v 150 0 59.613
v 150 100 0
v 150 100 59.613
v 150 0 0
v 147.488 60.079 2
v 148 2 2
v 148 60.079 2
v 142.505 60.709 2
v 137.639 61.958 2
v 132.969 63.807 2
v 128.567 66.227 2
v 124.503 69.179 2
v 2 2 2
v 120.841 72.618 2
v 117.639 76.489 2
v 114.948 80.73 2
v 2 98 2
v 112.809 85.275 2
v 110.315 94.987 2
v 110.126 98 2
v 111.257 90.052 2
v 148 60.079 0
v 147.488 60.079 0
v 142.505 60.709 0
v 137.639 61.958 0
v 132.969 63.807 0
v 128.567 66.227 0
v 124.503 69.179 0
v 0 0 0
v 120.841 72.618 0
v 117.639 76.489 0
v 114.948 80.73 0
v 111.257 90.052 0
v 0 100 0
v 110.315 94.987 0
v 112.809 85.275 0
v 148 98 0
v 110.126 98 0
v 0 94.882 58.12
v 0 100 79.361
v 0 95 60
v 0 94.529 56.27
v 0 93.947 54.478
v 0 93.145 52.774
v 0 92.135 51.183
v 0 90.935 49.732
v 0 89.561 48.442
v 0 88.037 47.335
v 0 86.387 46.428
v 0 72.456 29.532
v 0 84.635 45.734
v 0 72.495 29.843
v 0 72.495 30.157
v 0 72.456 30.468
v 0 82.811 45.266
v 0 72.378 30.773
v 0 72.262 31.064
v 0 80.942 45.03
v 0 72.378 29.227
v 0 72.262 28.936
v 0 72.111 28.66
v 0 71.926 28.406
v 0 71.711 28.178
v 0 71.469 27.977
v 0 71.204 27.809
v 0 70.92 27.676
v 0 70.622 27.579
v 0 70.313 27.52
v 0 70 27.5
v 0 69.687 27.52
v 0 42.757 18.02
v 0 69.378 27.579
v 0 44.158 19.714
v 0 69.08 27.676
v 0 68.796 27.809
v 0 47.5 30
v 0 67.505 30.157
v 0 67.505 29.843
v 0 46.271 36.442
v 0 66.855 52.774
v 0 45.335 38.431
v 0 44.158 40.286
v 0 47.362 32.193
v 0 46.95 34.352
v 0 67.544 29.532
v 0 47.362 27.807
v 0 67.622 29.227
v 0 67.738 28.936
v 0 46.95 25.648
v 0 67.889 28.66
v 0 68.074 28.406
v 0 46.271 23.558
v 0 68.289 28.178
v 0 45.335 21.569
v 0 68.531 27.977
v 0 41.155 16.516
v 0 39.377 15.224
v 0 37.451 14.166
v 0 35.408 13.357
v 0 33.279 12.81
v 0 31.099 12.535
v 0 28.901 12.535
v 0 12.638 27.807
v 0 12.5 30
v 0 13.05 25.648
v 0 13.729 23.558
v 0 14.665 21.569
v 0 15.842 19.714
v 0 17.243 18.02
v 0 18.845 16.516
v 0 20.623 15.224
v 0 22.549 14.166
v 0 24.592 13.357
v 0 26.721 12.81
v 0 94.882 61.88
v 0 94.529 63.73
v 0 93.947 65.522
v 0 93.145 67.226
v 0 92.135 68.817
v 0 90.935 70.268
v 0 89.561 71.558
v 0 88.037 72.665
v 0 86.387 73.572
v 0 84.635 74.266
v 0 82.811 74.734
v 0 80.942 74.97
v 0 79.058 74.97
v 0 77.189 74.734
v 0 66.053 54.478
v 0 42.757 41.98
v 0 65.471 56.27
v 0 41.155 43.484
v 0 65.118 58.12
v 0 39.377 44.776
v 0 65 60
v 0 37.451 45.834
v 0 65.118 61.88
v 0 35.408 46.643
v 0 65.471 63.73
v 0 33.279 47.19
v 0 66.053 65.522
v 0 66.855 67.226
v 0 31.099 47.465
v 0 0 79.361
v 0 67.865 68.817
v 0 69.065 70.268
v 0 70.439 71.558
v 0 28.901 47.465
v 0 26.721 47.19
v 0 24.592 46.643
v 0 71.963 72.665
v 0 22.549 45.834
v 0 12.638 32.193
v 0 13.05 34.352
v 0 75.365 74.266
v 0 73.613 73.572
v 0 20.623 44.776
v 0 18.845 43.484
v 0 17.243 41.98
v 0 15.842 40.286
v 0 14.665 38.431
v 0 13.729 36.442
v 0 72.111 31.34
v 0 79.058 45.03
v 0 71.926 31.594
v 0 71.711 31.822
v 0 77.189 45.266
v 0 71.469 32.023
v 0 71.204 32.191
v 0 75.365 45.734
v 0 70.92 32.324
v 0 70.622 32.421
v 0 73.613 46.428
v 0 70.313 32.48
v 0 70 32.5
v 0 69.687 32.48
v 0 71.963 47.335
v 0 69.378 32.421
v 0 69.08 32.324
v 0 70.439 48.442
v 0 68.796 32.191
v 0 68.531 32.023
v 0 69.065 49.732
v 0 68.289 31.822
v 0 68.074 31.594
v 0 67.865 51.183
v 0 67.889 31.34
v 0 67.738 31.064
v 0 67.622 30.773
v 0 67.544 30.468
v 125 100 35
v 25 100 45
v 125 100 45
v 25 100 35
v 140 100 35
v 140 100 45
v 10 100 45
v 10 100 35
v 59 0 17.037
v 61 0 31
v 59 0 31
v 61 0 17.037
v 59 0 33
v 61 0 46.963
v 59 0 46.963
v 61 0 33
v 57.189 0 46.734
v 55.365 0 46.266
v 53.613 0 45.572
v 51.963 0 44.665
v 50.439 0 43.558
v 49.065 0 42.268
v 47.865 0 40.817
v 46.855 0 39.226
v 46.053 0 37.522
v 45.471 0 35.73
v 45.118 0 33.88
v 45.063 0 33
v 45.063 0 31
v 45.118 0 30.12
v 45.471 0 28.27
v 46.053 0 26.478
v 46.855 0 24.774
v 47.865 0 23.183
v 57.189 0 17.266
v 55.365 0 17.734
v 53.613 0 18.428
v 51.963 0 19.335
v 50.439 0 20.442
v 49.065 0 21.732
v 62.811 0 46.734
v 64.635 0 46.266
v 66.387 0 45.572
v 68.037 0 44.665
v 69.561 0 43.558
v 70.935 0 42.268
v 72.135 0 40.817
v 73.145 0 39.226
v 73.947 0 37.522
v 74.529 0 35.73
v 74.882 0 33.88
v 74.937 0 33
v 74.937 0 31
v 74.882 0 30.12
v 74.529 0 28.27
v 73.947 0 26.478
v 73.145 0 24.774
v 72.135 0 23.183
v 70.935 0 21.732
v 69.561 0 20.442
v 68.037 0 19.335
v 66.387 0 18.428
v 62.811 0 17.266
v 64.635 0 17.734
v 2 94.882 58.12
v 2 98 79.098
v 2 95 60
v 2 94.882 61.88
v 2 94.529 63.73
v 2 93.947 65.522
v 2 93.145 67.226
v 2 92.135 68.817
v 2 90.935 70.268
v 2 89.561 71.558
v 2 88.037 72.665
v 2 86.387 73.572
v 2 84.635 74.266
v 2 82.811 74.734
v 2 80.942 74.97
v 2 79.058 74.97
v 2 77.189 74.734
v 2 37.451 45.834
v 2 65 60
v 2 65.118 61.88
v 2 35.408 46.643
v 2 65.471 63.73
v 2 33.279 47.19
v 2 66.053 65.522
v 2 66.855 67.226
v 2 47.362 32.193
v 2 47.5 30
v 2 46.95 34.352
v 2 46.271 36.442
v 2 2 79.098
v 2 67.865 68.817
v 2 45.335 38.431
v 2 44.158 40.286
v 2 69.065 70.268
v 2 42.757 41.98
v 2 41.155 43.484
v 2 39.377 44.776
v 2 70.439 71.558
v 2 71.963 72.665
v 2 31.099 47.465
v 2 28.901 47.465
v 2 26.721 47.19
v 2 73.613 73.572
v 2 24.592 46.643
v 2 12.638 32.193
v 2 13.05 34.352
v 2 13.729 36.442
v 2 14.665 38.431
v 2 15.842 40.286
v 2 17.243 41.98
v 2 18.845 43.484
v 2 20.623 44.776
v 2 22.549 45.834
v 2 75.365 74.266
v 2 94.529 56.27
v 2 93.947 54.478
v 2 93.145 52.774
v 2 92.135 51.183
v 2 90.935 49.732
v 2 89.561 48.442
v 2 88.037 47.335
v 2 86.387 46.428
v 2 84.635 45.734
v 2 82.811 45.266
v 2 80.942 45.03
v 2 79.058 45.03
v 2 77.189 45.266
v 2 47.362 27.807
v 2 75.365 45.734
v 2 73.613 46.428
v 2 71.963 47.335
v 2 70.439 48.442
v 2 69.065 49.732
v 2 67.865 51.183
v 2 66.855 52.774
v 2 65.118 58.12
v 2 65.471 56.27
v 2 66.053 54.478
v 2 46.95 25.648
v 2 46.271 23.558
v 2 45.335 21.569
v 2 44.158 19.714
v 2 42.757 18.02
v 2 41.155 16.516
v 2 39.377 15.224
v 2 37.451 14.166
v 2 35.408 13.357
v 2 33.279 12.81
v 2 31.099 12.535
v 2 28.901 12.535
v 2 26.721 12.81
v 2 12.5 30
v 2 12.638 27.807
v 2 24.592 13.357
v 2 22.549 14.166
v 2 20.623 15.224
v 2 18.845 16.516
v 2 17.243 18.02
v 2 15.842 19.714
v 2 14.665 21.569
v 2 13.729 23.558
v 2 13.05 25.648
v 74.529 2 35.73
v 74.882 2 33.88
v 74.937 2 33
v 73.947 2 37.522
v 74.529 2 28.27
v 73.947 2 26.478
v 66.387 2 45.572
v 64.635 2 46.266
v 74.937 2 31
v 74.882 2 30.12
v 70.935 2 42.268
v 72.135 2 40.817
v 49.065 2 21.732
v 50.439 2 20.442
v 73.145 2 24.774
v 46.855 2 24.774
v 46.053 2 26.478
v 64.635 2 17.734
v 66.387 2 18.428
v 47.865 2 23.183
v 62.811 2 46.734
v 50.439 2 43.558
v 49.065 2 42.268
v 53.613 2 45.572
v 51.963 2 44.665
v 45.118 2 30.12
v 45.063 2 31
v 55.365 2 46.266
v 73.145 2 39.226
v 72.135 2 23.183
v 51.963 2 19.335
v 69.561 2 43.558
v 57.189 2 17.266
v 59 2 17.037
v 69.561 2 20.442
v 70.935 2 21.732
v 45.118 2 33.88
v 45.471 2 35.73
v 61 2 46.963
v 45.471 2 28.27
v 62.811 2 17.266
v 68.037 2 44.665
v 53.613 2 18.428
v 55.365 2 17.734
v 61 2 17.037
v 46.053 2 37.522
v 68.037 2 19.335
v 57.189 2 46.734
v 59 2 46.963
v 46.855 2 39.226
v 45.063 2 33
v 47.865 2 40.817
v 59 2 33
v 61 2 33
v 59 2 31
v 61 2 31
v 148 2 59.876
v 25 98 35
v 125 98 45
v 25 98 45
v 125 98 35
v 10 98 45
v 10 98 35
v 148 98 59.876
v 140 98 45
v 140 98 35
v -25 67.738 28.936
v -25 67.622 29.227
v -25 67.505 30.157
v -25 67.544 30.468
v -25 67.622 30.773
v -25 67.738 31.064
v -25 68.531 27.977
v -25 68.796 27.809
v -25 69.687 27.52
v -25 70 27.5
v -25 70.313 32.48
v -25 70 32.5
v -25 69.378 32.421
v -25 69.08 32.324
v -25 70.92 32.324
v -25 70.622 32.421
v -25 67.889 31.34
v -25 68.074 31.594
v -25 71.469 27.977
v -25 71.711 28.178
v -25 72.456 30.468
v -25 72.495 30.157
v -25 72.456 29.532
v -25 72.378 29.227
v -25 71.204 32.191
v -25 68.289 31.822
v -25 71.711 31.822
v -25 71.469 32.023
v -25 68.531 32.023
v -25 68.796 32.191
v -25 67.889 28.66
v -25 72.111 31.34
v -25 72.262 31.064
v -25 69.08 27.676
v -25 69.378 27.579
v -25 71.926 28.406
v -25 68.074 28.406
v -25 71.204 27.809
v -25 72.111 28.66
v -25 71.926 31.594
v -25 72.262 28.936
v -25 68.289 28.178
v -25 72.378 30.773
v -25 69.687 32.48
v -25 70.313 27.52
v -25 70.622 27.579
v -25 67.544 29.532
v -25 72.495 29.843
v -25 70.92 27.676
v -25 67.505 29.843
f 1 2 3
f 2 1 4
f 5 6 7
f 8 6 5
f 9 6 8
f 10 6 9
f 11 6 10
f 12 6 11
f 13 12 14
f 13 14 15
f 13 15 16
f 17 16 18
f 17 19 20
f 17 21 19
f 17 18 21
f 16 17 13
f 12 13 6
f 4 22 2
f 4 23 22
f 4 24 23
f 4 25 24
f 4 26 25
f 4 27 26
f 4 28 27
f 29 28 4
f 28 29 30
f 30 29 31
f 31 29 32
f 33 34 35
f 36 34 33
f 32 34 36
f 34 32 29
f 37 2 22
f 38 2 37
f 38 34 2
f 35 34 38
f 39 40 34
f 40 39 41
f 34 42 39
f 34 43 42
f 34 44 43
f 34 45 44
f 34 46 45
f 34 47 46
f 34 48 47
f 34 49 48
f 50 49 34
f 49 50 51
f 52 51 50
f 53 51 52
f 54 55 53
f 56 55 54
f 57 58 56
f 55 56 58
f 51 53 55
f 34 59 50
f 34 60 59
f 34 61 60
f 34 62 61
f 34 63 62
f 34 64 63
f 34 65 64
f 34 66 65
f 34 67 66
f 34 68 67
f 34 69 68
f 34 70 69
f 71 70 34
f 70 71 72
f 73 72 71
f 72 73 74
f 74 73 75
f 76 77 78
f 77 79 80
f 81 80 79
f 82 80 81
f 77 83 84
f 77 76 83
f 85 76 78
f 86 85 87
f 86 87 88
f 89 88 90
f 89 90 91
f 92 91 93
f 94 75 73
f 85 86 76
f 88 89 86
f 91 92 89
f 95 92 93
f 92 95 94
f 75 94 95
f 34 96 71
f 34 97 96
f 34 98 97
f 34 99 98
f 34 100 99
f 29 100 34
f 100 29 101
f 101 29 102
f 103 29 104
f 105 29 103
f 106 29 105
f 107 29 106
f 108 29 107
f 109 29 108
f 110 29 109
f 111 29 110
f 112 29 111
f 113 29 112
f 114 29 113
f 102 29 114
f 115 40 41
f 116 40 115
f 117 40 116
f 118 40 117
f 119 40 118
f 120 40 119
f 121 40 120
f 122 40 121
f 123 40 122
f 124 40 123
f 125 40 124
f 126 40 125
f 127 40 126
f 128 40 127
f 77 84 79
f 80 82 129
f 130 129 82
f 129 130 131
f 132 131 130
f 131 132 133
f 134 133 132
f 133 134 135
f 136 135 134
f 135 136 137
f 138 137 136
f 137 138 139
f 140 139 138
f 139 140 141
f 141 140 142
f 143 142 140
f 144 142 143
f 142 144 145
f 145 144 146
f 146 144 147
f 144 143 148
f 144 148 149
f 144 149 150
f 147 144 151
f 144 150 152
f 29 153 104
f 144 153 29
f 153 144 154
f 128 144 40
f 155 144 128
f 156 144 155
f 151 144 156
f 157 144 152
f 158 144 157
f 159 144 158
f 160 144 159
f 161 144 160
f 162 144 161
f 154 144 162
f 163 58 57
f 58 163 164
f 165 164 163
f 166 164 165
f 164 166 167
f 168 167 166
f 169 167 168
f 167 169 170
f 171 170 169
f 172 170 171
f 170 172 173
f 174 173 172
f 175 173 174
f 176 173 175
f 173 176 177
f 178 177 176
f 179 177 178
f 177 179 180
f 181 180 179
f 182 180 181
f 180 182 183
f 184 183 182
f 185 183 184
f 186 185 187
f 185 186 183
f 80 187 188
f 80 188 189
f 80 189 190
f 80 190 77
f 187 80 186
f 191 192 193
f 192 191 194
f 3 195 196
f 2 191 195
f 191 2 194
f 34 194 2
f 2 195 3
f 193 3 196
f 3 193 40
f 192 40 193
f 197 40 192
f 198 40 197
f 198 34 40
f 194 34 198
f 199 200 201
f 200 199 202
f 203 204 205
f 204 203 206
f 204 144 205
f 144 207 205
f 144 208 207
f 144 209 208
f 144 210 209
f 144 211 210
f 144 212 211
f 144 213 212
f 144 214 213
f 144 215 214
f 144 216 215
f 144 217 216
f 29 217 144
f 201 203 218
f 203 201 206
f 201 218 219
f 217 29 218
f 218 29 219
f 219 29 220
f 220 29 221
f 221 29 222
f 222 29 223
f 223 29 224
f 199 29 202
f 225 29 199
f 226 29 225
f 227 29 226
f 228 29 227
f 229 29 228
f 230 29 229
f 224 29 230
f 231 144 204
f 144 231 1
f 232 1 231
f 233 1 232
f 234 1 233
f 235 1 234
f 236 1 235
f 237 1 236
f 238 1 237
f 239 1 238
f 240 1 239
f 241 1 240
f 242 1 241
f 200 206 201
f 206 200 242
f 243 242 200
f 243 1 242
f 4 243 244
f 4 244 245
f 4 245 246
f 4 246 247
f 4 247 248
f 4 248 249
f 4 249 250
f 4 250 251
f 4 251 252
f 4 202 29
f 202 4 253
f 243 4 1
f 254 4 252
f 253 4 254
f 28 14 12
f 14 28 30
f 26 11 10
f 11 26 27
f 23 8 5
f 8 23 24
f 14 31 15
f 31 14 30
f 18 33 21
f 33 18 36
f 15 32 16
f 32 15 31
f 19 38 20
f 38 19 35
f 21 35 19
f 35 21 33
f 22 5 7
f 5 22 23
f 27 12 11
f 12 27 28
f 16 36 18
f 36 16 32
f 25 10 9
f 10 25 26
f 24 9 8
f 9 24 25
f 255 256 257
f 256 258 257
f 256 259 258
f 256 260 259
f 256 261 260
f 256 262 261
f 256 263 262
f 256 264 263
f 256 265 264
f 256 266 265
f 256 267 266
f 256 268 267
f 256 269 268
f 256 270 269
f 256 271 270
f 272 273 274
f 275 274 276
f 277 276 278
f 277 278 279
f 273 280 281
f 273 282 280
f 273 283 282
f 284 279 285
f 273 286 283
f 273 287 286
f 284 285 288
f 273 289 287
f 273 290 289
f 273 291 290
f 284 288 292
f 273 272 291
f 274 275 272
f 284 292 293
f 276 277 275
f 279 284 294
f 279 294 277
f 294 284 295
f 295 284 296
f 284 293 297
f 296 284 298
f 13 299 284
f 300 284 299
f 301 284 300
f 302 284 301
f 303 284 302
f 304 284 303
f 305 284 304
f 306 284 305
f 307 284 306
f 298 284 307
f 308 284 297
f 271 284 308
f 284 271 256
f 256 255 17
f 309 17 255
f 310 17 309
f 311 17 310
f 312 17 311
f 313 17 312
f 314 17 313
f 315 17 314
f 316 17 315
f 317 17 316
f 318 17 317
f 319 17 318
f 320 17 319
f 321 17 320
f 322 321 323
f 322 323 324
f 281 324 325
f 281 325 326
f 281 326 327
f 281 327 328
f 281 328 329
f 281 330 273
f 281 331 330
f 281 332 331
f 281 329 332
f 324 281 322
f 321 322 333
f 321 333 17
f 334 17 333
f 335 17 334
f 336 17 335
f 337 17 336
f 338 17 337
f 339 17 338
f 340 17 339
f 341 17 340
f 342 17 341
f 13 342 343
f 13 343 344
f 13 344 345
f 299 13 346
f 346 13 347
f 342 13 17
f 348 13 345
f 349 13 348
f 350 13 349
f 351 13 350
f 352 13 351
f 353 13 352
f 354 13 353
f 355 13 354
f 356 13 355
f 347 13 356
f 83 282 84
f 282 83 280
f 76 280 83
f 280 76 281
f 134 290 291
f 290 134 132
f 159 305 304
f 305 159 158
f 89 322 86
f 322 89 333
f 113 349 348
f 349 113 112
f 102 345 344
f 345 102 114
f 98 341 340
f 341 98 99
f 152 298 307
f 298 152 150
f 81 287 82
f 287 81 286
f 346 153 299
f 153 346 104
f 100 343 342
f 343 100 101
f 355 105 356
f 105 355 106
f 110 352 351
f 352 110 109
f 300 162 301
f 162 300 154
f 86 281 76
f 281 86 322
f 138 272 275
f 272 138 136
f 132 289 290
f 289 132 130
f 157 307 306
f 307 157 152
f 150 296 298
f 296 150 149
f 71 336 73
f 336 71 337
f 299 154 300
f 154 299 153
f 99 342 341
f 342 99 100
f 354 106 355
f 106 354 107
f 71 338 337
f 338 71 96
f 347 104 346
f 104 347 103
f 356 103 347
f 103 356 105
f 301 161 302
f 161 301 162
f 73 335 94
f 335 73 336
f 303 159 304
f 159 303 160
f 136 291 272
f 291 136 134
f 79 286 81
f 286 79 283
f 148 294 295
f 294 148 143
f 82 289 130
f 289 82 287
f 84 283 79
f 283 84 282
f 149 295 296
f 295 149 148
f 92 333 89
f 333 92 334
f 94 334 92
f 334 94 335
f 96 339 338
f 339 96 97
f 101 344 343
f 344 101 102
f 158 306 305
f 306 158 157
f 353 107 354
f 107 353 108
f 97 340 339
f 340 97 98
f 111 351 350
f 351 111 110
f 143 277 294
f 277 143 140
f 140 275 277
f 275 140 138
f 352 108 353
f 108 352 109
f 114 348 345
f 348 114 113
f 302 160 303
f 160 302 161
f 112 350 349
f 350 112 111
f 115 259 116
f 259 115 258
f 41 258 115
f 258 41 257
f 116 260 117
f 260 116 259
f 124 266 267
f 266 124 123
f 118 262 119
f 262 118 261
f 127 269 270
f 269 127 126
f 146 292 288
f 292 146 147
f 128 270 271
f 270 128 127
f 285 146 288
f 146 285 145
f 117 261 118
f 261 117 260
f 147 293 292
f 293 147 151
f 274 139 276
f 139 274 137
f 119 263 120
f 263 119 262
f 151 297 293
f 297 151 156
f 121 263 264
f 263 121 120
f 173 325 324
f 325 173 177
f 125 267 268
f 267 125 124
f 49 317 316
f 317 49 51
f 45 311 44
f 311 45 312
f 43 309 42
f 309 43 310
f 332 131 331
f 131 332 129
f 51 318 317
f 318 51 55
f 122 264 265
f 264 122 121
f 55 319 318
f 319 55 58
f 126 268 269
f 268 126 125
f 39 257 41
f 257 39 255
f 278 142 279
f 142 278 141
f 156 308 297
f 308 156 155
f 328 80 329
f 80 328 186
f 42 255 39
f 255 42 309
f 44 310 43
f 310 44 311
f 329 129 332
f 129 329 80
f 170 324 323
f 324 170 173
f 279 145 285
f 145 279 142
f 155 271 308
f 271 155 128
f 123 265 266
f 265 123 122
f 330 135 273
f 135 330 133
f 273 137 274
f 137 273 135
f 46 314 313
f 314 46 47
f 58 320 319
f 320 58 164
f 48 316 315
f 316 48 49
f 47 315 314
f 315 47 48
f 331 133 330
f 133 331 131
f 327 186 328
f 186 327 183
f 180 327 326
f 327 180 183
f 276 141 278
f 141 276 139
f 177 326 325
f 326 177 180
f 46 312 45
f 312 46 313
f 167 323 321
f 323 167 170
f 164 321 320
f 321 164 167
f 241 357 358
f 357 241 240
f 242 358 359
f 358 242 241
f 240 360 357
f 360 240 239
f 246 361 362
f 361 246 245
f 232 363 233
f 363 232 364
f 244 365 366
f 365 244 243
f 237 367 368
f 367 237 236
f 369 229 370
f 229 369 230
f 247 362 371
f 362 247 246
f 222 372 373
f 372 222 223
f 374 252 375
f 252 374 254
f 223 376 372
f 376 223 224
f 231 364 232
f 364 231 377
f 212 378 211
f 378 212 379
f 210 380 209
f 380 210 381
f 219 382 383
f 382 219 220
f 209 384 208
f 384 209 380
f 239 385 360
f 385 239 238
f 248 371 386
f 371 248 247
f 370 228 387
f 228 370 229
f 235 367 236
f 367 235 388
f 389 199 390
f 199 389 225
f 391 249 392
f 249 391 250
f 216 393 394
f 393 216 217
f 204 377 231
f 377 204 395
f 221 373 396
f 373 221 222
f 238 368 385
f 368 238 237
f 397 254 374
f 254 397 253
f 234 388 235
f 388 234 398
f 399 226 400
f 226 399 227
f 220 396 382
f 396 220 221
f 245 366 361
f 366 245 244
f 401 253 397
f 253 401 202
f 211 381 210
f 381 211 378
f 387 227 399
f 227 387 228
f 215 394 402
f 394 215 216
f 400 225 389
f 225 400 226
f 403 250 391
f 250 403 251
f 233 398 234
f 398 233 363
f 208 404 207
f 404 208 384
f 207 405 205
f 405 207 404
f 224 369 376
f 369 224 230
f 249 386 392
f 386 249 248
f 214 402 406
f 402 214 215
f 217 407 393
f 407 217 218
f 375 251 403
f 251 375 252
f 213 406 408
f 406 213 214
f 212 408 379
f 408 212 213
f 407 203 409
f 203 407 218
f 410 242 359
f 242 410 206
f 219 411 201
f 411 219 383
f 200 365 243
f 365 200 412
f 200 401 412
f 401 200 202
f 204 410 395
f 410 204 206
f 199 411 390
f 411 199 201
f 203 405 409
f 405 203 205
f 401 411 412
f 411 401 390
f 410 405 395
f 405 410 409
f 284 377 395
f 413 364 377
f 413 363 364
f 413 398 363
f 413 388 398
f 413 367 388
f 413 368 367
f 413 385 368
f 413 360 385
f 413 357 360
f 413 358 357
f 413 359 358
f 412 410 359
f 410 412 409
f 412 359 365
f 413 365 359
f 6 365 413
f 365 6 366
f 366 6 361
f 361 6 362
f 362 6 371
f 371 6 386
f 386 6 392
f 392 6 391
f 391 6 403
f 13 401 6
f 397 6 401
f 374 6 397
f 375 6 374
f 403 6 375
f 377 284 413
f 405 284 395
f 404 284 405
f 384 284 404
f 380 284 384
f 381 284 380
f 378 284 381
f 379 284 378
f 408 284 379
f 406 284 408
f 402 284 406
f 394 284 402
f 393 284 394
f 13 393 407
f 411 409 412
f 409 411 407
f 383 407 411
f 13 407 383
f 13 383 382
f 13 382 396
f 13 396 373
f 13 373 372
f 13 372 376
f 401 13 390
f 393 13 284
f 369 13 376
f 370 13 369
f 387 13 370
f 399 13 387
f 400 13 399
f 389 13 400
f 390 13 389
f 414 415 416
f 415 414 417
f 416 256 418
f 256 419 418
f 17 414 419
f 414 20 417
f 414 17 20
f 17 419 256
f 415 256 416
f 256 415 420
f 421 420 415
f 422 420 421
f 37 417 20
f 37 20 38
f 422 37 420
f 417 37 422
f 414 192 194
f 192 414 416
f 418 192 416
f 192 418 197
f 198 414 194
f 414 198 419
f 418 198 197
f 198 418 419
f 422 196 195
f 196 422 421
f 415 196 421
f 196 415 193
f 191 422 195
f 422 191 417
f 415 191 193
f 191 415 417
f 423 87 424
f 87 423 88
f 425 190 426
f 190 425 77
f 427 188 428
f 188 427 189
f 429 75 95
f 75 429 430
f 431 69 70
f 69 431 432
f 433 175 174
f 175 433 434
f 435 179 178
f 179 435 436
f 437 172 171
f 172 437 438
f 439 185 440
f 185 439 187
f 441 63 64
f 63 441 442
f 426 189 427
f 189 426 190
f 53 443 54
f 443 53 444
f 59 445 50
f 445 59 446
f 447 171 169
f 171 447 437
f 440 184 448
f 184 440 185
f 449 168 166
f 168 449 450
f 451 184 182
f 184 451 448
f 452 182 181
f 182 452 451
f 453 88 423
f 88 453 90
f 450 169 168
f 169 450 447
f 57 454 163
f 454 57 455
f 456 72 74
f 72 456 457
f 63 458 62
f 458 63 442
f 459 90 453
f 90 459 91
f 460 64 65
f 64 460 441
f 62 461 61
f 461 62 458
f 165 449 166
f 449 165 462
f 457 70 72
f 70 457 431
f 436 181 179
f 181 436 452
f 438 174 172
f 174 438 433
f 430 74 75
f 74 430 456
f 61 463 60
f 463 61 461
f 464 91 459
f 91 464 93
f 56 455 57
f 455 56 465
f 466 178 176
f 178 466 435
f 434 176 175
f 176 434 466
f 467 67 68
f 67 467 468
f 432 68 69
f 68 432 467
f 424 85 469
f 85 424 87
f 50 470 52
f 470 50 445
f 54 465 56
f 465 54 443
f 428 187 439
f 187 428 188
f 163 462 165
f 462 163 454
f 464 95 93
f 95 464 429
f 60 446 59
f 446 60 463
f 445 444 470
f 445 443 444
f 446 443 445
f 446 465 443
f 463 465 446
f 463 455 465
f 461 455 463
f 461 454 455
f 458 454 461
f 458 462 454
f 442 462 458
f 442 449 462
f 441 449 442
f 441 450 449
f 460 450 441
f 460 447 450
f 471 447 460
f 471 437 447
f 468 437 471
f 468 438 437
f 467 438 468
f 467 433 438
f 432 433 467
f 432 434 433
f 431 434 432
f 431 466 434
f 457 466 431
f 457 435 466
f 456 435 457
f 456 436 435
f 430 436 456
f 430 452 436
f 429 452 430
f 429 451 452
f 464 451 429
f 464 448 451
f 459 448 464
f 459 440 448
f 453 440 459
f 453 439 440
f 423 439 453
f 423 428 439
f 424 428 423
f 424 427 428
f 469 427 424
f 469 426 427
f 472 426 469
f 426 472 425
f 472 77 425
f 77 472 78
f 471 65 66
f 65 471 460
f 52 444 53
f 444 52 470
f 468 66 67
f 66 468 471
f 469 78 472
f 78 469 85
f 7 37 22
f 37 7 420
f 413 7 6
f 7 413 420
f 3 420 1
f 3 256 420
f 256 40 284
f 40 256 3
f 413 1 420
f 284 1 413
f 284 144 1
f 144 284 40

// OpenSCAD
roof = false;

difference() {
    if(!roof) {
        union() {
            // floor
            difference() {
                cube([150, 100, 2]);
                
                translate([150, 100, 0])
                cylinder(6, r=40, center=true, $fn=50);
            }

            // left wall
            difference() {
                cube([2, 100, 80]);
                
                // large hole
                translate([0, 30, 30])
                rotate([90, 0, 90])
                cylinder(6, d=35, center=true, $fn=50);
                
                // small hole
                translate([0, 80, 60])
                rotate([90, 0, 90])
                cylinder(6, d=30, center=true, $fn=50);
            }
            
            translate([0, 70, 30])
            rotate([0, -90, 0])
            cylinder(25, d=5, $fn=50);

            // right wall
            translate([148, 0, 0])
            cube([2, 100, 60]);
            
            // front wall
            base_points = [
                [0, 0, 0], //btm left
                [150, 0, 0], //btm right
                [0, 0, 80], //top left
                [150, 0, 60], //top right
            ];
            
            thickness = [0, 2, 0];
            
            points = [
                base_points[0],
                base_points[1],
                base_points[1] + thickness,
                base_points[0] + thickness,
                base_points[2],
                base_points[3],
                base_points[3] + thickness,
                base_points[2] + thickness,
            ];
            
            faces = [
                [0,1,2,3], // bottom
                [4,5,1,0], // front
                [7,6,5,4], // top
                [5,6,2,1], // right
                [6,7,3,2], // back
                [7,4,0,3], // left
            ];
            
            difference() {
                polyhedron(points, faces);
                
                // window
                translate([60, 0, 32])
                difference() {
                    rotate([90, 0, 0])
                    cylinder(6, d=30, center=true, $fn=50);
                    cube([30, 7, 2], center=true);
                    rotate([0, 90, 0])
                    cube([30, 7, 2], center=true);
                }
            }

            
            // back wall
            difference() {
                translate([0, 98, 0])
                polyhedron(points, faces);
                
                // mounting holes
                translate([10, 97, 35])
                cube([15, 4, 10]);
                
                translate([125, 97, 35])
                cube([15, 4, 10]);
            }
        }
    }
    
    union() {
        // roof
        translate([75, 50, 71])
        rotate([0, 7.5, 0])
        cube([154, 102, 3], center=true);
        
        // left lip
        translate([2.2, 2.2, 76.5])
        cube([2, 95.6, 3]);
        
        // right lip
        translate([145.8, 2.2, 57.5])
        cube([2, 95.6, 3]);
        
        // front lip
        translate([75, 3.2, 68.5])
        rotate([0, 7.5, 0])
        cube([146, 2, 3], center=true);
        
        // back lip
        translate([75, 96.8, 68.5])
        rotate([0, 7.5, 0])
        cube([146, 2, 3], center=true);
    }
}
